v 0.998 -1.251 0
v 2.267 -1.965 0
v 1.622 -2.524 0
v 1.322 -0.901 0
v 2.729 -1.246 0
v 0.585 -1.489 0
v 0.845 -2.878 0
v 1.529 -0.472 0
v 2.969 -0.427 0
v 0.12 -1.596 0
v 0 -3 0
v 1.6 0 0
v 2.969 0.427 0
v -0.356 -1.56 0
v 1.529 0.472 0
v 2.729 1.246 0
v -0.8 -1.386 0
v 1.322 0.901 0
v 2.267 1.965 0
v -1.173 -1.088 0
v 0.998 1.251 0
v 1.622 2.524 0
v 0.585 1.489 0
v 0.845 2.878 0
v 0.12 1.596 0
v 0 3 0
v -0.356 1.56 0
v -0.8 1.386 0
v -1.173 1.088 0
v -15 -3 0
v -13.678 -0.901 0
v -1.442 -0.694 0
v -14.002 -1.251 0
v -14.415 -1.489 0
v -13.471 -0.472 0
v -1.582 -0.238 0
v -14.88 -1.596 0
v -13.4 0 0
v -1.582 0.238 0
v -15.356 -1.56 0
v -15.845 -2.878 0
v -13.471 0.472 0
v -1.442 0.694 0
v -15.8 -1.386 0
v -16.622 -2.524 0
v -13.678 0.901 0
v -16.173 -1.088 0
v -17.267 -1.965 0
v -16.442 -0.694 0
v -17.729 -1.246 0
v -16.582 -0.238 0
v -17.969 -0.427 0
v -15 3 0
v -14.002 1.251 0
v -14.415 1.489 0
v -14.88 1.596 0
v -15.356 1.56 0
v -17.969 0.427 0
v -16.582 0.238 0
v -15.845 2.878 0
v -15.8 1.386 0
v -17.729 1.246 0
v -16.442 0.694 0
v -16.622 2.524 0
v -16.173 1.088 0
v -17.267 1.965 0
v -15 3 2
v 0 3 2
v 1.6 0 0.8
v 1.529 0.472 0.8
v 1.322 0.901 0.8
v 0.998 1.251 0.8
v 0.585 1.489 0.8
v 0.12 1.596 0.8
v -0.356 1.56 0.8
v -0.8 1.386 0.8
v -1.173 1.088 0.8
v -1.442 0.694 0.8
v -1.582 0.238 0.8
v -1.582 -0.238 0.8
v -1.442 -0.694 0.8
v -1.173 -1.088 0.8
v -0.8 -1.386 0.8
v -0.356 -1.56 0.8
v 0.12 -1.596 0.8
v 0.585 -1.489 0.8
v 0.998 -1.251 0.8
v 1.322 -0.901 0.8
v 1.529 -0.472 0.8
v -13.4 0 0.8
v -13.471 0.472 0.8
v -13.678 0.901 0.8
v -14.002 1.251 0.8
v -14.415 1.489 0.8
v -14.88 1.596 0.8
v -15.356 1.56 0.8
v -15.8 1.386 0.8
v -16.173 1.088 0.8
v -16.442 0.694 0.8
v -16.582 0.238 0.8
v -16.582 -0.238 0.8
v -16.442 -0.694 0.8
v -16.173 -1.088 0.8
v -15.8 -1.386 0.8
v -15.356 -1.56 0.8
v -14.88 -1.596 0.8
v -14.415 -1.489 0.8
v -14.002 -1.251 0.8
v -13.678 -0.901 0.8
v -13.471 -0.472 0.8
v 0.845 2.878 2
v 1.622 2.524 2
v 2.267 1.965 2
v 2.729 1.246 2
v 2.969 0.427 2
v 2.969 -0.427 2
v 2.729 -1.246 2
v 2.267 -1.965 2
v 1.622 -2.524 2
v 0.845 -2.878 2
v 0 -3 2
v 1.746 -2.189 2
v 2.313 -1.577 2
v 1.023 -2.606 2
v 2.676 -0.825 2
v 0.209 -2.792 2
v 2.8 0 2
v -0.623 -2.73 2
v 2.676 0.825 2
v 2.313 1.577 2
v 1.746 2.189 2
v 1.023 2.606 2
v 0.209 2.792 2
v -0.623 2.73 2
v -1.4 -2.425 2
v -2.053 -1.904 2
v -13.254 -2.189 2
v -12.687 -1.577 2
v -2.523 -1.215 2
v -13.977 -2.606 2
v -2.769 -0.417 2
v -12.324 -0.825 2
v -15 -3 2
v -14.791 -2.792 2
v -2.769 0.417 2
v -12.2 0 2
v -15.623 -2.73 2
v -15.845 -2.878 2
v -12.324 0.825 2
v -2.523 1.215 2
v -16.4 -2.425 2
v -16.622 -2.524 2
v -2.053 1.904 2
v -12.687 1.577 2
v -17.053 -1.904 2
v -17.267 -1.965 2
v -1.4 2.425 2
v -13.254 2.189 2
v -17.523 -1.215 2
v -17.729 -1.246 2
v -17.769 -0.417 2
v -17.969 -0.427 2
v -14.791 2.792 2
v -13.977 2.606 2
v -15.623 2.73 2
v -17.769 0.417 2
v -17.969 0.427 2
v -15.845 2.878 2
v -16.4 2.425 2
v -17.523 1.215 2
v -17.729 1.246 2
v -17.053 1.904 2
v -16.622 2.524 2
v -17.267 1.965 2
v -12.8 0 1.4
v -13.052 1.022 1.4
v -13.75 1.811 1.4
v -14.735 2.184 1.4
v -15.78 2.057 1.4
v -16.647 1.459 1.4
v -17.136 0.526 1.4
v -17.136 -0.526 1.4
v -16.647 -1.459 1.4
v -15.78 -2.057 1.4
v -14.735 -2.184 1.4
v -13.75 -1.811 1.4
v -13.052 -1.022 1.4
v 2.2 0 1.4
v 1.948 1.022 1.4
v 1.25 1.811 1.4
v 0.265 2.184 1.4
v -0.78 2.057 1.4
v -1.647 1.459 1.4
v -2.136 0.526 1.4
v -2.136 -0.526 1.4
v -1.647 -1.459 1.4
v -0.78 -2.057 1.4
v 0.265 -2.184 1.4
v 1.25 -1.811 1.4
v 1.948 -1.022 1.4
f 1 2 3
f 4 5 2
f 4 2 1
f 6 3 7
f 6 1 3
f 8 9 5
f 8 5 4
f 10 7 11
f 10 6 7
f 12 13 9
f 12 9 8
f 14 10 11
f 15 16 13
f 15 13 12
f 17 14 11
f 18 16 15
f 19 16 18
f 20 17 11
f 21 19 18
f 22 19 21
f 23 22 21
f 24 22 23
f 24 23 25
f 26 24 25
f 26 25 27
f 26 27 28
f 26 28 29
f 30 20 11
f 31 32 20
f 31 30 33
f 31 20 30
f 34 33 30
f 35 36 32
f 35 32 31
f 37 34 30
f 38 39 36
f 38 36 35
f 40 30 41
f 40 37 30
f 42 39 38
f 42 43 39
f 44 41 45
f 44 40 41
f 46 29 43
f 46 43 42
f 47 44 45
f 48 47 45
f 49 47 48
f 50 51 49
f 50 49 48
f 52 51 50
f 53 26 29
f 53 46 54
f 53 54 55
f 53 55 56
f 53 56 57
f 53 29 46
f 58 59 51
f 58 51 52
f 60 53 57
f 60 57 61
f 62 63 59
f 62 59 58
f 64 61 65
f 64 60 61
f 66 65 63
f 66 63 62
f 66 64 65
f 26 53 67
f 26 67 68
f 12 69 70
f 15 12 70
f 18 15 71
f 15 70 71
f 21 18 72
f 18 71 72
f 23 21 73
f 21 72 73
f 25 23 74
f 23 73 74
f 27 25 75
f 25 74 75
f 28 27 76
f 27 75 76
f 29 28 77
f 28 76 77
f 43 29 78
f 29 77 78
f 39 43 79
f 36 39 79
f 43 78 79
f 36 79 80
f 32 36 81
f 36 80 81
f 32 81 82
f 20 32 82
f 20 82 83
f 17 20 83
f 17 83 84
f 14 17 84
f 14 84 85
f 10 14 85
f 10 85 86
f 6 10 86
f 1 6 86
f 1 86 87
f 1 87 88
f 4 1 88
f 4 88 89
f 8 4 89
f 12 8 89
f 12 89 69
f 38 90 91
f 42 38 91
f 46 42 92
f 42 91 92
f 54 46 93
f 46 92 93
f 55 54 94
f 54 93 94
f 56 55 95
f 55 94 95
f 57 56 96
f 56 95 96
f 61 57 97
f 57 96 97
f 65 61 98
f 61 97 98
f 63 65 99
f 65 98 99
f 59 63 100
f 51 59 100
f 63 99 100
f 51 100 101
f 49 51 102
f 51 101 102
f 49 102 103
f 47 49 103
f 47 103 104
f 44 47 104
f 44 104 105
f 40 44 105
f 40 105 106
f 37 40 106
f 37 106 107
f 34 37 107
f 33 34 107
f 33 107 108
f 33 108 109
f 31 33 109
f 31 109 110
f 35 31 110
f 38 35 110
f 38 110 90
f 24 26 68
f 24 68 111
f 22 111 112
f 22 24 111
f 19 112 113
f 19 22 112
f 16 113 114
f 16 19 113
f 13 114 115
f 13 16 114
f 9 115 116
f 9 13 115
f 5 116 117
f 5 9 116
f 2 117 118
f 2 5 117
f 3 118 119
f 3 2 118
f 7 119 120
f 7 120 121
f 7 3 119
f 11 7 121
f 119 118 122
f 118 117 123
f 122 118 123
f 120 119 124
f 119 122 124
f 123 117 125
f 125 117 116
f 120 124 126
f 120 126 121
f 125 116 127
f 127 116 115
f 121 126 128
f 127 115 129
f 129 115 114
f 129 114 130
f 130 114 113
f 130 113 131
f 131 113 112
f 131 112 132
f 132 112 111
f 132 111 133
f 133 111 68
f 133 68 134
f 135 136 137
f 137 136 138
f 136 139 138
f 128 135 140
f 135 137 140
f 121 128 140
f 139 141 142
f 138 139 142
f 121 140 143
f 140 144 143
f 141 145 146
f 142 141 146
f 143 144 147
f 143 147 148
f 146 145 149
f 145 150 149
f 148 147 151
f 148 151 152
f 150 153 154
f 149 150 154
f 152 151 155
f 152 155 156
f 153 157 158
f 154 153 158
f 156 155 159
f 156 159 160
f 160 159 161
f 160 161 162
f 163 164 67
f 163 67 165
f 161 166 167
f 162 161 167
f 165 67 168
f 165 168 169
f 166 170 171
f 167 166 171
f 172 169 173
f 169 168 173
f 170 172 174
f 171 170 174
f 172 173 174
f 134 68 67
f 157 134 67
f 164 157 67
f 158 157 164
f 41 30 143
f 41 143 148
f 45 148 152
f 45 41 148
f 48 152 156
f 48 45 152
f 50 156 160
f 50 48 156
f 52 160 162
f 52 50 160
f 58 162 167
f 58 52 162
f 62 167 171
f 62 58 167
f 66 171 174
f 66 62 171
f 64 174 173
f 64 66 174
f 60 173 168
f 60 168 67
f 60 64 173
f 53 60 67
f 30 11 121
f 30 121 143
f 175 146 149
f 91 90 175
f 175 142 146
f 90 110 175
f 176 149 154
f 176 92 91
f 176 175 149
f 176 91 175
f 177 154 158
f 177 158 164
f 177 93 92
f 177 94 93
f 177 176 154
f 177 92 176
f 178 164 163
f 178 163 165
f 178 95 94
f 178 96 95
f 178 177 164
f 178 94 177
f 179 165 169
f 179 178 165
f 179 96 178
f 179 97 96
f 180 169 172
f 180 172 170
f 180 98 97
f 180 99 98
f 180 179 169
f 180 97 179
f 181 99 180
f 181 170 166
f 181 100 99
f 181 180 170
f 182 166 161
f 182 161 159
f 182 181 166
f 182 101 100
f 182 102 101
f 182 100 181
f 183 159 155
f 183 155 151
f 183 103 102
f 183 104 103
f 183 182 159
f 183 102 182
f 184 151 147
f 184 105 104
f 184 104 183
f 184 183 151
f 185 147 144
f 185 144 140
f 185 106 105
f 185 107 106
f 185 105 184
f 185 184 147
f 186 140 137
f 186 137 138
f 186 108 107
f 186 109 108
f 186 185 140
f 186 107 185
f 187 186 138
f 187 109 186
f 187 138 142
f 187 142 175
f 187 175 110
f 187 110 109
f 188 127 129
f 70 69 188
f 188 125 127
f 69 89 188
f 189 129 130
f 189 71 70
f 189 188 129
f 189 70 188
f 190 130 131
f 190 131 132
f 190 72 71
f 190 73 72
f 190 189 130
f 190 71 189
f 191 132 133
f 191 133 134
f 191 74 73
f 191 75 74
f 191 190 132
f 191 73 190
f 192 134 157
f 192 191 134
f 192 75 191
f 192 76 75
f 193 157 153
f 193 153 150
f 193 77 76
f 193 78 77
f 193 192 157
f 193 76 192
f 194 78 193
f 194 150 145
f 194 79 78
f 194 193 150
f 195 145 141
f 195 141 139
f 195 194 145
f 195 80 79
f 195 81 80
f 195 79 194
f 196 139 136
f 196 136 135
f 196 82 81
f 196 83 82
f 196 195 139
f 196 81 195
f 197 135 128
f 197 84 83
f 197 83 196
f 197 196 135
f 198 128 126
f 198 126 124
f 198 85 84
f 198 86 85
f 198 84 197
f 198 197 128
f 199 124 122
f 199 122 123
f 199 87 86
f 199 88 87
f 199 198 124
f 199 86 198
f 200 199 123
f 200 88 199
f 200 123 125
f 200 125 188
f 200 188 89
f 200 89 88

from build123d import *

# Parameters (mm, degrees)
EXTRUDE_1_DEPTH     = 2
SKETCH_2_R          = 1.6
CUT_EXTRUDE_1_DEPTH = 19.357559751
CHAMFER_1_SIZE      = 1.2


with BuildPart() as part:
    # 草图1 → 凸台-拉伸1 (new body)
    with BuildSketch(Plane.XY):
        with BuildLine():
            Line((0, -3), (-15, -3))
            ThreePointArc((-15, -3), (-18, 0), (-15, 3))
            Line((-15, 3), (0, 3))
            ThreePointArc((0, 3), (3, 0), (0, -3))
        make_face()
    extrude(amount=EXTRUDE_1_DEPTH)

    # 草图2 → 切除-拉伸1 (cut, through all)
    with BuildSketch(Plane.XY.offset(2)):
        Circle(SKETCH_2_R)
        with Locations((-15, 0)):
            Circle(SKETCH_2_R)
    extrude(amount=-CUT_EXTRUDE_1_DEPTH, mode=Mode.SUBTRACT)

    # 倒角1
    chamfer_1_edges = [part.edges().sort_by_distance(p)[0] for p in [
        (-1.6, 0, 2),
        (-16.6, 0, 2),
    ]]
    chamfer(chamfer_1_edges, length=CHAMFER_1_SIZE)


solid = part.part
